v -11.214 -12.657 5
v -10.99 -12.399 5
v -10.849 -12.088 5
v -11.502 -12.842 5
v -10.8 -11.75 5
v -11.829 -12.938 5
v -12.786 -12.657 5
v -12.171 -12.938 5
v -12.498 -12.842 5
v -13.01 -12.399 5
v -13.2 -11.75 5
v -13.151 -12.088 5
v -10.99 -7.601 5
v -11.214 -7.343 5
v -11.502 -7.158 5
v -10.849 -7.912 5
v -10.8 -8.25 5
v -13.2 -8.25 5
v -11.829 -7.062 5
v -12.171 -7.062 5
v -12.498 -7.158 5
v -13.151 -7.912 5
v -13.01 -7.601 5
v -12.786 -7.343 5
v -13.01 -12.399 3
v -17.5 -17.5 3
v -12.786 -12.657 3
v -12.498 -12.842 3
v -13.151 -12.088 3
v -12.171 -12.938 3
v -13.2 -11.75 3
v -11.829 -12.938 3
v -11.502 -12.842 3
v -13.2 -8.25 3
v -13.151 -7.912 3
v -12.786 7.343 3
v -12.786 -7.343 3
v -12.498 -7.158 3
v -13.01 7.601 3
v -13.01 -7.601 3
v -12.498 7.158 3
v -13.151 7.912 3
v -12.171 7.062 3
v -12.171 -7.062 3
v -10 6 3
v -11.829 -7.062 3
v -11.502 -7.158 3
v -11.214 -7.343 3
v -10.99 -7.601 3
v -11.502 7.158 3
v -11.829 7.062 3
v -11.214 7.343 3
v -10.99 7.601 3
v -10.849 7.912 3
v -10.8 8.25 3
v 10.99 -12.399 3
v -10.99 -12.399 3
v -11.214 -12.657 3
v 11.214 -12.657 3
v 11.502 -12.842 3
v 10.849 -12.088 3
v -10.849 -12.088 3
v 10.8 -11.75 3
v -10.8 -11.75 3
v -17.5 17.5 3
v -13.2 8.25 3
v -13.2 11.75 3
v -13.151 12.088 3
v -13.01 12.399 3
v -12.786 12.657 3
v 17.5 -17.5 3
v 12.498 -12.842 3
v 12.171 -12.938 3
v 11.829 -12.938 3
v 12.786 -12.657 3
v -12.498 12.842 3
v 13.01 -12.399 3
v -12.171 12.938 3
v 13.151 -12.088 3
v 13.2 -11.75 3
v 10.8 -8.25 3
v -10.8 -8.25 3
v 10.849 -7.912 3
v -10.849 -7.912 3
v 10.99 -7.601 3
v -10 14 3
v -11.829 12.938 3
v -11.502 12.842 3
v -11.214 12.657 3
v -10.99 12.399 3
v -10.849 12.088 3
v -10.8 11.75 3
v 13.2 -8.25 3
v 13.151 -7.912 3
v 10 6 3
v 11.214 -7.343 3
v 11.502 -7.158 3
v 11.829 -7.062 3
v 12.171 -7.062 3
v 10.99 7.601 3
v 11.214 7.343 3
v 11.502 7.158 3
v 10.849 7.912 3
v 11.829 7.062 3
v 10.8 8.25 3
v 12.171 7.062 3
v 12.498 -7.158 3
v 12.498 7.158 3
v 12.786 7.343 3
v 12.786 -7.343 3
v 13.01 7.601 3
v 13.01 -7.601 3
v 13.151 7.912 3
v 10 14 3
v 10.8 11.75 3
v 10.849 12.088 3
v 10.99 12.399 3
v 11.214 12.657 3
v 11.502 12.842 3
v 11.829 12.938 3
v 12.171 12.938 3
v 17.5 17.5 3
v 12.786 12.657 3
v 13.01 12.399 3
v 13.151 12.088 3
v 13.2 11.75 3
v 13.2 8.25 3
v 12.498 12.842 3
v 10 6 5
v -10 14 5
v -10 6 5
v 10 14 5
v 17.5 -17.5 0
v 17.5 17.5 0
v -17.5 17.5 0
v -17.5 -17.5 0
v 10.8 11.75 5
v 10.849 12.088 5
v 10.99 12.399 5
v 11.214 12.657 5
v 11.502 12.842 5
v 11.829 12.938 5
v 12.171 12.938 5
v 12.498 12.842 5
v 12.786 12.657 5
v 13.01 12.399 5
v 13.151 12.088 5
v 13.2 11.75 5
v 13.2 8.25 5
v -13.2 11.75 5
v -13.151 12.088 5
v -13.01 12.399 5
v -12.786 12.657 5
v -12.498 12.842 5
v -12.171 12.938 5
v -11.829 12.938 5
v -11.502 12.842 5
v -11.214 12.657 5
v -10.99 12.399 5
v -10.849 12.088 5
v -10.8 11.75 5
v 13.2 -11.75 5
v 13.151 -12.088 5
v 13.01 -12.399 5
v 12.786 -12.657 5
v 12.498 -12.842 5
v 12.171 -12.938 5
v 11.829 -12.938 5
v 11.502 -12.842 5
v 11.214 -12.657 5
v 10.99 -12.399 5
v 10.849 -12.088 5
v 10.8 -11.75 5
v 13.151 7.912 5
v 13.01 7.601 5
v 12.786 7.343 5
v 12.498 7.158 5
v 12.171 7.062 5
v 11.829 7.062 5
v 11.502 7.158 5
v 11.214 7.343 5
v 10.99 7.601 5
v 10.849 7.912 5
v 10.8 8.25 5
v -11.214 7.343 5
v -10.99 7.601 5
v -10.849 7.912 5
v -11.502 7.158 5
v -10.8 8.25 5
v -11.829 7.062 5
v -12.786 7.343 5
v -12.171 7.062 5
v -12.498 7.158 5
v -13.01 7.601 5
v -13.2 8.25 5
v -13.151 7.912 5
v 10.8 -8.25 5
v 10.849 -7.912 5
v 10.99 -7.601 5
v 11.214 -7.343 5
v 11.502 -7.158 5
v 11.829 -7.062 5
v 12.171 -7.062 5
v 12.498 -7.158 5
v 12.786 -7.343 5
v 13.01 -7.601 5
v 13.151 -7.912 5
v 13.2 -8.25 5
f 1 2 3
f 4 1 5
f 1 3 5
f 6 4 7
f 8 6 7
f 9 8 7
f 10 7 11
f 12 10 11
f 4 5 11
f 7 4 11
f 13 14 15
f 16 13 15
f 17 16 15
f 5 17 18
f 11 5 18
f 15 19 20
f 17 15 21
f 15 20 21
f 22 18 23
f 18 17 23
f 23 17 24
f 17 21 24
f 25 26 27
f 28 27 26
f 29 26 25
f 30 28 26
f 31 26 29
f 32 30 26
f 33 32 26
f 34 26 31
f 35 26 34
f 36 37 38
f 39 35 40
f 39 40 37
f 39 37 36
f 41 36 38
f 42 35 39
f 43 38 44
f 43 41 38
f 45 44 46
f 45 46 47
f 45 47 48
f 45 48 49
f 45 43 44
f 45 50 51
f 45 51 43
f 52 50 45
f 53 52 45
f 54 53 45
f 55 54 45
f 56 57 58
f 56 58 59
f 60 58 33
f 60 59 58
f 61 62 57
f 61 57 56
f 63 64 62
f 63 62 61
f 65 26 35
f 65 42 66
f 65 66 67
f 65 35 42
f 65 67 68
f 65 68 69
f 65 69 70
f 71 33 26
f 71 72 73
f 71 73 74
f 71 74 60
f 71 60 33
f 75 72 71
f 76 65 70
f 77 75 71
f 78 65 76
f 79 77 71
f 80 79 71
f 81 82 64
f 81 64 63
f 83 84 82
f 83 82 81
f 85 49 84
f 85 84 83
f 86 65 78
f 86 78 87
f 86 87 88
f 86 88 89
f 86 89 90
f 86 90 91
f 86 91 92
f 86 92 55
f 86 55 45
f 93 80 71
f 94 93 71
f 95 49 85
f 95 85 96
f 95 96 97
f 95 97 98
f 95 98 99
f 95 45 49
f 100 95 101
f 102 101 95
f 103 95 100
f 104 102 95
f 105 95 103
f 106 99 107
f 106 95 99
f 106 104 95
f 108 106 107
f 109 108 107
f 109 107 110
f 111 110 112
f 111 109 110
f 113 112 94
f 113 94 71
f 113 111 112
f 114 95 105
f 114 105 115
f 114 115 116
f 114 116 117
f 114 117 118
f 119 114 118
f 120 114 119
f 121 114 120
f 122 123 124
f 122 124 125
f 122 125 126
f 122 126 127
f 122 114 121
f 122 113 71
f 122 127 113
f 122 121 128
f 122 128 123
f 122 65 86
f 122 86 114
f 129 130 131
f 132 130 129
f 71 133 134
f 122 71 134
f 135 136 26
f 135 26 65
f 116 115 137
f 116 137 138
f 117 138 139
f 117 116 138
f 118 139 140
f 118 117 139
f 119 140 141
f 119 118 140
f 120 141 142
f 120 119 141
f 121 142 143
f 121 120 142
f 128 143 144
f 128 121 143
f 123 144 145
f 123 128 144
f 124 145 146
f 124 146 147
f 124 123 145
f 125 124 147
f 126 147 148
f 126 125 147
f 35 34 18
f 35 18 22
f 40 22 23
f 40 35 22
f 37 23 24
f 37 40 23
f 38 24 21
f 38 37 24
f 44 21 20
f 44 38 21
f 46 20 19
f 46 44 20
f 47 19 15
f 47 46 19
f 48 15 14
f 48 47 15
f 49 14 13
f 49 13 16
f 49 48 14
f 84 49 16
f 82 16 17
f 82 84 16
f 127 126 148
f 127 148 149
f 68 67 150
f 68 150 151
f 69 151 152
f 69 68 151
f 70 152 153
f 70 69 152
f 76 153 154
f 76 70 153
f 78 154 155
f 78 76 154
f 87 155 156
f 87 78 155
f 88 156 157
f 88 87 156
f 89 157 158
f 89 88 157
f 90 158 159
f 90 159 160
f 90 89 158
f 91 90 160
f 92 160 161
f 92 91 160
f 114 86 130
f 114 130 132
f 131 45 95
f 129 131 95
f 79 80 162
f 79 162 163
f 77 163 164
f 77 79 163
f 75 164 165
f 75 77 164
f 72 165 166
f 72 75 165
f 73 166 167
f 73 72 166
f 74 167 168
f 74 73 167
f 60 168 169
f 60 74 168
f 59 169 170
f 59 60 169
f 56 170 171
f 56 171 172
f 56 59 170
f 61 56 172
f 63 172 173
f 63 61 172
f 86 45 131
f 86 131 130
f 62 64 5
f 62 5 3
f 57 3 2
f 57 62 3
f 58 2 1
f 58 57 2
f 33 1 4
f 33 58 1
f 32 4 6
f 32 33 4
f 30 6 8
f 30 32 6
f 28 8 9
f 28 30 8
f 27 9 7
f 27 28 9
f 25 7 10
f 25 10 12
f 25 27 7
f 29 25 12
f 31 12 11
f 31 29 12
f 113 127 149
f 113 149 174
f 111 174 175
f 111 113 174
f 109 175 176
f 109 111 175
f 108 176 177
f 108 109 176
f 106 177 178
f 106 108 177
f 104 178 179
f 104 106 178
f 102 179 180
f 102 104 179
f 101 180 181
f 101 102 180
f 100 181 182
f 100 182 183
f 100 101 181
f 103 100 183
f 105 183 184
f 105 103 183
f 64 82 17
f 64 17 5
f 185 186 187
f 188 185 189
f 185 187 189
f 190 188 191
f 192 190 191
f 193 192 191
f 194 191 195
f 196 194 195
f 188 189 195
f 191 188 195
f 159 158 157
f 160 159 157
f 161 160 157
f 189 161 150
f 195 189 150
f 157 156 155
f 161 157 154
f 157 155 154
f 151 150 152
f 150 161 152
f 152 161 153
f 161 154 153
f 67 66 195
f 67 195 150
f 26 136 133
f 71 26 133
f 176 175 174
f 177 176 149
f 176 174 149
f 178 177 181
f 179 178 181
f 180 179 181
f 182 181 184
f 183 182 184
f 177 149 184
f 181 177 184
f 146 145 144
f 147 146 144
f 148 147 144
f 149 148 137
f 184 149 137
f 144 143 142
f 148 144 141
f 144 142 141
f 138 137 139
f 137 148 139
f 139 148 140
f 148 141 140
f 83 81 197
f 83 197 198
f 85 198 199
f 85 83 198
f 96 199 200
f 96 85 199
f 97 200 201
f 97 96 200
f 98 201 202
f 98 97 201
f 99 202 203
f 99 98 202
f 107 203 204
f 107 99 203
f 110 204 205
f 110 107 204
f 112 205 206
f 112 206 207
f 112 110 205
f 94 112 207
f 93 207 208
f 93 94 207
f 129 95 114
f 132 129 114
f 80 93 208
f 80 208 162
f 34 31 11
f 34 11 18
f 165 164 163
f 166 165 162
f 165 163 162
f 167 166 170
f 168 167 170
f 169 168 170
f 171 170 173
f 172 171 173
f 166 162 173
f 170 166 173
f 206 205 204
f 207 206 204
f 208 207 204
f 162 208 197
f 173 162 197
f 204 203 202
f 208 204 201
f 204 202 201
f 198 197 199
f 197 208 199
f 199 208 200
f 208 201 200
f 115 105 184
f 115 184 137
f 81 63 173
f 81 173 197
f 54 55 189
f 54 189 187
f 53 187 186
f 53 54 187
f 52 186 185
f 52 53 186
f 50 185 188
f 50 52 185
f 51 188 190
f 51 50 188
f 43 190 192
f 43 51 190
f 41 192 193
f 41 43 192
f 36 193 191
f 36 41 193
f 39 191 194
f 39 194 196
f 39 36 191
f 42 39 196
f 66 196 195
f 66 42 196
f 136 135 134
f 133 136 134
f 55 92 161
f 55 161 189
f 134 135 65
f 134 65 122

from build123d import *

# Parameters (mm, degrees)
SKETCH2_W           = 35
SKETCH2_H           = 35
BOSS_EXTRUDE1_DEPTH = 3
SKETCH3_W           = 20
SKETCH3_H           = 8
BOSS_EXTRUDE2_DEPTH = 2


with BuildPart() as part:
    # Sketch2 → Boss-Extrude1 (new body)
    with BuildSketch(Plane.XY):
        Rectangle(SKETCH2_W, SKETCH2_H)
    extrude(amount=BOSS_EXTRUDE1_DEPTH)

    # Sketch3 → Boss-Extrude2 (add)
    with BuildSketch(Plane.XY.offset(3)):
        with BuildLine():
            Line((-13.2, 8.25), (-13.2, 11.75))
            ThreePointArc((-13.2, 11.75), (-12, 12.95), (-10.8, 11.75))
            Line((-10.8, 11.75), (-10.8, 8.25))
            ThreePointArc((-10.8, 8.25), (-12, 7.05), (-13.2, 8.25))
        make_face()
        with BuildLine():
            Line((-13.2, -11.75), (-13.2, -8.25))
            ThreePointArc((-13.2, -8.25), (-12, -7.05), (-10.8, -8.25))
            Line((-10.8, -8.25), (-10.8, -11.75))
            ThreePointArc((-10.8, -11.75), (-12, -12.95), (-13.2, -11.75))
        make_face()
        with BuildLine():
            Line((10.8, -11.75), (10.8, -8.25))
            ThreePointArc((10.8, -8.25), (12, -7.05), (13.2, -8.25))
            Line((13.2, -8.25), (13.2, -11.75))
            ThreePointArc((13.2, -11.75), (12, -12.95), (10.8, -11.75))
        make_face()
        with BuildLine():
            Line((10.8, 8.25), (10.8, 11.75))
            ThreePointArc((10.8, 11.75), (12, 12.95), (13.2, 11.75))
            Line((13.2, 11.75), (13.2, 8.25))
            ThreePointArc((13.2, 8.25), (12, 7.05), (10.8, 8.25))
        make_face()
        with Locations((0, 10)):
            Rectangle(SKETCH3_W, SKETCH3_H)
    extrude(amount=BOSS_EXTRUDE2_DEPTH)


solid = part.part
